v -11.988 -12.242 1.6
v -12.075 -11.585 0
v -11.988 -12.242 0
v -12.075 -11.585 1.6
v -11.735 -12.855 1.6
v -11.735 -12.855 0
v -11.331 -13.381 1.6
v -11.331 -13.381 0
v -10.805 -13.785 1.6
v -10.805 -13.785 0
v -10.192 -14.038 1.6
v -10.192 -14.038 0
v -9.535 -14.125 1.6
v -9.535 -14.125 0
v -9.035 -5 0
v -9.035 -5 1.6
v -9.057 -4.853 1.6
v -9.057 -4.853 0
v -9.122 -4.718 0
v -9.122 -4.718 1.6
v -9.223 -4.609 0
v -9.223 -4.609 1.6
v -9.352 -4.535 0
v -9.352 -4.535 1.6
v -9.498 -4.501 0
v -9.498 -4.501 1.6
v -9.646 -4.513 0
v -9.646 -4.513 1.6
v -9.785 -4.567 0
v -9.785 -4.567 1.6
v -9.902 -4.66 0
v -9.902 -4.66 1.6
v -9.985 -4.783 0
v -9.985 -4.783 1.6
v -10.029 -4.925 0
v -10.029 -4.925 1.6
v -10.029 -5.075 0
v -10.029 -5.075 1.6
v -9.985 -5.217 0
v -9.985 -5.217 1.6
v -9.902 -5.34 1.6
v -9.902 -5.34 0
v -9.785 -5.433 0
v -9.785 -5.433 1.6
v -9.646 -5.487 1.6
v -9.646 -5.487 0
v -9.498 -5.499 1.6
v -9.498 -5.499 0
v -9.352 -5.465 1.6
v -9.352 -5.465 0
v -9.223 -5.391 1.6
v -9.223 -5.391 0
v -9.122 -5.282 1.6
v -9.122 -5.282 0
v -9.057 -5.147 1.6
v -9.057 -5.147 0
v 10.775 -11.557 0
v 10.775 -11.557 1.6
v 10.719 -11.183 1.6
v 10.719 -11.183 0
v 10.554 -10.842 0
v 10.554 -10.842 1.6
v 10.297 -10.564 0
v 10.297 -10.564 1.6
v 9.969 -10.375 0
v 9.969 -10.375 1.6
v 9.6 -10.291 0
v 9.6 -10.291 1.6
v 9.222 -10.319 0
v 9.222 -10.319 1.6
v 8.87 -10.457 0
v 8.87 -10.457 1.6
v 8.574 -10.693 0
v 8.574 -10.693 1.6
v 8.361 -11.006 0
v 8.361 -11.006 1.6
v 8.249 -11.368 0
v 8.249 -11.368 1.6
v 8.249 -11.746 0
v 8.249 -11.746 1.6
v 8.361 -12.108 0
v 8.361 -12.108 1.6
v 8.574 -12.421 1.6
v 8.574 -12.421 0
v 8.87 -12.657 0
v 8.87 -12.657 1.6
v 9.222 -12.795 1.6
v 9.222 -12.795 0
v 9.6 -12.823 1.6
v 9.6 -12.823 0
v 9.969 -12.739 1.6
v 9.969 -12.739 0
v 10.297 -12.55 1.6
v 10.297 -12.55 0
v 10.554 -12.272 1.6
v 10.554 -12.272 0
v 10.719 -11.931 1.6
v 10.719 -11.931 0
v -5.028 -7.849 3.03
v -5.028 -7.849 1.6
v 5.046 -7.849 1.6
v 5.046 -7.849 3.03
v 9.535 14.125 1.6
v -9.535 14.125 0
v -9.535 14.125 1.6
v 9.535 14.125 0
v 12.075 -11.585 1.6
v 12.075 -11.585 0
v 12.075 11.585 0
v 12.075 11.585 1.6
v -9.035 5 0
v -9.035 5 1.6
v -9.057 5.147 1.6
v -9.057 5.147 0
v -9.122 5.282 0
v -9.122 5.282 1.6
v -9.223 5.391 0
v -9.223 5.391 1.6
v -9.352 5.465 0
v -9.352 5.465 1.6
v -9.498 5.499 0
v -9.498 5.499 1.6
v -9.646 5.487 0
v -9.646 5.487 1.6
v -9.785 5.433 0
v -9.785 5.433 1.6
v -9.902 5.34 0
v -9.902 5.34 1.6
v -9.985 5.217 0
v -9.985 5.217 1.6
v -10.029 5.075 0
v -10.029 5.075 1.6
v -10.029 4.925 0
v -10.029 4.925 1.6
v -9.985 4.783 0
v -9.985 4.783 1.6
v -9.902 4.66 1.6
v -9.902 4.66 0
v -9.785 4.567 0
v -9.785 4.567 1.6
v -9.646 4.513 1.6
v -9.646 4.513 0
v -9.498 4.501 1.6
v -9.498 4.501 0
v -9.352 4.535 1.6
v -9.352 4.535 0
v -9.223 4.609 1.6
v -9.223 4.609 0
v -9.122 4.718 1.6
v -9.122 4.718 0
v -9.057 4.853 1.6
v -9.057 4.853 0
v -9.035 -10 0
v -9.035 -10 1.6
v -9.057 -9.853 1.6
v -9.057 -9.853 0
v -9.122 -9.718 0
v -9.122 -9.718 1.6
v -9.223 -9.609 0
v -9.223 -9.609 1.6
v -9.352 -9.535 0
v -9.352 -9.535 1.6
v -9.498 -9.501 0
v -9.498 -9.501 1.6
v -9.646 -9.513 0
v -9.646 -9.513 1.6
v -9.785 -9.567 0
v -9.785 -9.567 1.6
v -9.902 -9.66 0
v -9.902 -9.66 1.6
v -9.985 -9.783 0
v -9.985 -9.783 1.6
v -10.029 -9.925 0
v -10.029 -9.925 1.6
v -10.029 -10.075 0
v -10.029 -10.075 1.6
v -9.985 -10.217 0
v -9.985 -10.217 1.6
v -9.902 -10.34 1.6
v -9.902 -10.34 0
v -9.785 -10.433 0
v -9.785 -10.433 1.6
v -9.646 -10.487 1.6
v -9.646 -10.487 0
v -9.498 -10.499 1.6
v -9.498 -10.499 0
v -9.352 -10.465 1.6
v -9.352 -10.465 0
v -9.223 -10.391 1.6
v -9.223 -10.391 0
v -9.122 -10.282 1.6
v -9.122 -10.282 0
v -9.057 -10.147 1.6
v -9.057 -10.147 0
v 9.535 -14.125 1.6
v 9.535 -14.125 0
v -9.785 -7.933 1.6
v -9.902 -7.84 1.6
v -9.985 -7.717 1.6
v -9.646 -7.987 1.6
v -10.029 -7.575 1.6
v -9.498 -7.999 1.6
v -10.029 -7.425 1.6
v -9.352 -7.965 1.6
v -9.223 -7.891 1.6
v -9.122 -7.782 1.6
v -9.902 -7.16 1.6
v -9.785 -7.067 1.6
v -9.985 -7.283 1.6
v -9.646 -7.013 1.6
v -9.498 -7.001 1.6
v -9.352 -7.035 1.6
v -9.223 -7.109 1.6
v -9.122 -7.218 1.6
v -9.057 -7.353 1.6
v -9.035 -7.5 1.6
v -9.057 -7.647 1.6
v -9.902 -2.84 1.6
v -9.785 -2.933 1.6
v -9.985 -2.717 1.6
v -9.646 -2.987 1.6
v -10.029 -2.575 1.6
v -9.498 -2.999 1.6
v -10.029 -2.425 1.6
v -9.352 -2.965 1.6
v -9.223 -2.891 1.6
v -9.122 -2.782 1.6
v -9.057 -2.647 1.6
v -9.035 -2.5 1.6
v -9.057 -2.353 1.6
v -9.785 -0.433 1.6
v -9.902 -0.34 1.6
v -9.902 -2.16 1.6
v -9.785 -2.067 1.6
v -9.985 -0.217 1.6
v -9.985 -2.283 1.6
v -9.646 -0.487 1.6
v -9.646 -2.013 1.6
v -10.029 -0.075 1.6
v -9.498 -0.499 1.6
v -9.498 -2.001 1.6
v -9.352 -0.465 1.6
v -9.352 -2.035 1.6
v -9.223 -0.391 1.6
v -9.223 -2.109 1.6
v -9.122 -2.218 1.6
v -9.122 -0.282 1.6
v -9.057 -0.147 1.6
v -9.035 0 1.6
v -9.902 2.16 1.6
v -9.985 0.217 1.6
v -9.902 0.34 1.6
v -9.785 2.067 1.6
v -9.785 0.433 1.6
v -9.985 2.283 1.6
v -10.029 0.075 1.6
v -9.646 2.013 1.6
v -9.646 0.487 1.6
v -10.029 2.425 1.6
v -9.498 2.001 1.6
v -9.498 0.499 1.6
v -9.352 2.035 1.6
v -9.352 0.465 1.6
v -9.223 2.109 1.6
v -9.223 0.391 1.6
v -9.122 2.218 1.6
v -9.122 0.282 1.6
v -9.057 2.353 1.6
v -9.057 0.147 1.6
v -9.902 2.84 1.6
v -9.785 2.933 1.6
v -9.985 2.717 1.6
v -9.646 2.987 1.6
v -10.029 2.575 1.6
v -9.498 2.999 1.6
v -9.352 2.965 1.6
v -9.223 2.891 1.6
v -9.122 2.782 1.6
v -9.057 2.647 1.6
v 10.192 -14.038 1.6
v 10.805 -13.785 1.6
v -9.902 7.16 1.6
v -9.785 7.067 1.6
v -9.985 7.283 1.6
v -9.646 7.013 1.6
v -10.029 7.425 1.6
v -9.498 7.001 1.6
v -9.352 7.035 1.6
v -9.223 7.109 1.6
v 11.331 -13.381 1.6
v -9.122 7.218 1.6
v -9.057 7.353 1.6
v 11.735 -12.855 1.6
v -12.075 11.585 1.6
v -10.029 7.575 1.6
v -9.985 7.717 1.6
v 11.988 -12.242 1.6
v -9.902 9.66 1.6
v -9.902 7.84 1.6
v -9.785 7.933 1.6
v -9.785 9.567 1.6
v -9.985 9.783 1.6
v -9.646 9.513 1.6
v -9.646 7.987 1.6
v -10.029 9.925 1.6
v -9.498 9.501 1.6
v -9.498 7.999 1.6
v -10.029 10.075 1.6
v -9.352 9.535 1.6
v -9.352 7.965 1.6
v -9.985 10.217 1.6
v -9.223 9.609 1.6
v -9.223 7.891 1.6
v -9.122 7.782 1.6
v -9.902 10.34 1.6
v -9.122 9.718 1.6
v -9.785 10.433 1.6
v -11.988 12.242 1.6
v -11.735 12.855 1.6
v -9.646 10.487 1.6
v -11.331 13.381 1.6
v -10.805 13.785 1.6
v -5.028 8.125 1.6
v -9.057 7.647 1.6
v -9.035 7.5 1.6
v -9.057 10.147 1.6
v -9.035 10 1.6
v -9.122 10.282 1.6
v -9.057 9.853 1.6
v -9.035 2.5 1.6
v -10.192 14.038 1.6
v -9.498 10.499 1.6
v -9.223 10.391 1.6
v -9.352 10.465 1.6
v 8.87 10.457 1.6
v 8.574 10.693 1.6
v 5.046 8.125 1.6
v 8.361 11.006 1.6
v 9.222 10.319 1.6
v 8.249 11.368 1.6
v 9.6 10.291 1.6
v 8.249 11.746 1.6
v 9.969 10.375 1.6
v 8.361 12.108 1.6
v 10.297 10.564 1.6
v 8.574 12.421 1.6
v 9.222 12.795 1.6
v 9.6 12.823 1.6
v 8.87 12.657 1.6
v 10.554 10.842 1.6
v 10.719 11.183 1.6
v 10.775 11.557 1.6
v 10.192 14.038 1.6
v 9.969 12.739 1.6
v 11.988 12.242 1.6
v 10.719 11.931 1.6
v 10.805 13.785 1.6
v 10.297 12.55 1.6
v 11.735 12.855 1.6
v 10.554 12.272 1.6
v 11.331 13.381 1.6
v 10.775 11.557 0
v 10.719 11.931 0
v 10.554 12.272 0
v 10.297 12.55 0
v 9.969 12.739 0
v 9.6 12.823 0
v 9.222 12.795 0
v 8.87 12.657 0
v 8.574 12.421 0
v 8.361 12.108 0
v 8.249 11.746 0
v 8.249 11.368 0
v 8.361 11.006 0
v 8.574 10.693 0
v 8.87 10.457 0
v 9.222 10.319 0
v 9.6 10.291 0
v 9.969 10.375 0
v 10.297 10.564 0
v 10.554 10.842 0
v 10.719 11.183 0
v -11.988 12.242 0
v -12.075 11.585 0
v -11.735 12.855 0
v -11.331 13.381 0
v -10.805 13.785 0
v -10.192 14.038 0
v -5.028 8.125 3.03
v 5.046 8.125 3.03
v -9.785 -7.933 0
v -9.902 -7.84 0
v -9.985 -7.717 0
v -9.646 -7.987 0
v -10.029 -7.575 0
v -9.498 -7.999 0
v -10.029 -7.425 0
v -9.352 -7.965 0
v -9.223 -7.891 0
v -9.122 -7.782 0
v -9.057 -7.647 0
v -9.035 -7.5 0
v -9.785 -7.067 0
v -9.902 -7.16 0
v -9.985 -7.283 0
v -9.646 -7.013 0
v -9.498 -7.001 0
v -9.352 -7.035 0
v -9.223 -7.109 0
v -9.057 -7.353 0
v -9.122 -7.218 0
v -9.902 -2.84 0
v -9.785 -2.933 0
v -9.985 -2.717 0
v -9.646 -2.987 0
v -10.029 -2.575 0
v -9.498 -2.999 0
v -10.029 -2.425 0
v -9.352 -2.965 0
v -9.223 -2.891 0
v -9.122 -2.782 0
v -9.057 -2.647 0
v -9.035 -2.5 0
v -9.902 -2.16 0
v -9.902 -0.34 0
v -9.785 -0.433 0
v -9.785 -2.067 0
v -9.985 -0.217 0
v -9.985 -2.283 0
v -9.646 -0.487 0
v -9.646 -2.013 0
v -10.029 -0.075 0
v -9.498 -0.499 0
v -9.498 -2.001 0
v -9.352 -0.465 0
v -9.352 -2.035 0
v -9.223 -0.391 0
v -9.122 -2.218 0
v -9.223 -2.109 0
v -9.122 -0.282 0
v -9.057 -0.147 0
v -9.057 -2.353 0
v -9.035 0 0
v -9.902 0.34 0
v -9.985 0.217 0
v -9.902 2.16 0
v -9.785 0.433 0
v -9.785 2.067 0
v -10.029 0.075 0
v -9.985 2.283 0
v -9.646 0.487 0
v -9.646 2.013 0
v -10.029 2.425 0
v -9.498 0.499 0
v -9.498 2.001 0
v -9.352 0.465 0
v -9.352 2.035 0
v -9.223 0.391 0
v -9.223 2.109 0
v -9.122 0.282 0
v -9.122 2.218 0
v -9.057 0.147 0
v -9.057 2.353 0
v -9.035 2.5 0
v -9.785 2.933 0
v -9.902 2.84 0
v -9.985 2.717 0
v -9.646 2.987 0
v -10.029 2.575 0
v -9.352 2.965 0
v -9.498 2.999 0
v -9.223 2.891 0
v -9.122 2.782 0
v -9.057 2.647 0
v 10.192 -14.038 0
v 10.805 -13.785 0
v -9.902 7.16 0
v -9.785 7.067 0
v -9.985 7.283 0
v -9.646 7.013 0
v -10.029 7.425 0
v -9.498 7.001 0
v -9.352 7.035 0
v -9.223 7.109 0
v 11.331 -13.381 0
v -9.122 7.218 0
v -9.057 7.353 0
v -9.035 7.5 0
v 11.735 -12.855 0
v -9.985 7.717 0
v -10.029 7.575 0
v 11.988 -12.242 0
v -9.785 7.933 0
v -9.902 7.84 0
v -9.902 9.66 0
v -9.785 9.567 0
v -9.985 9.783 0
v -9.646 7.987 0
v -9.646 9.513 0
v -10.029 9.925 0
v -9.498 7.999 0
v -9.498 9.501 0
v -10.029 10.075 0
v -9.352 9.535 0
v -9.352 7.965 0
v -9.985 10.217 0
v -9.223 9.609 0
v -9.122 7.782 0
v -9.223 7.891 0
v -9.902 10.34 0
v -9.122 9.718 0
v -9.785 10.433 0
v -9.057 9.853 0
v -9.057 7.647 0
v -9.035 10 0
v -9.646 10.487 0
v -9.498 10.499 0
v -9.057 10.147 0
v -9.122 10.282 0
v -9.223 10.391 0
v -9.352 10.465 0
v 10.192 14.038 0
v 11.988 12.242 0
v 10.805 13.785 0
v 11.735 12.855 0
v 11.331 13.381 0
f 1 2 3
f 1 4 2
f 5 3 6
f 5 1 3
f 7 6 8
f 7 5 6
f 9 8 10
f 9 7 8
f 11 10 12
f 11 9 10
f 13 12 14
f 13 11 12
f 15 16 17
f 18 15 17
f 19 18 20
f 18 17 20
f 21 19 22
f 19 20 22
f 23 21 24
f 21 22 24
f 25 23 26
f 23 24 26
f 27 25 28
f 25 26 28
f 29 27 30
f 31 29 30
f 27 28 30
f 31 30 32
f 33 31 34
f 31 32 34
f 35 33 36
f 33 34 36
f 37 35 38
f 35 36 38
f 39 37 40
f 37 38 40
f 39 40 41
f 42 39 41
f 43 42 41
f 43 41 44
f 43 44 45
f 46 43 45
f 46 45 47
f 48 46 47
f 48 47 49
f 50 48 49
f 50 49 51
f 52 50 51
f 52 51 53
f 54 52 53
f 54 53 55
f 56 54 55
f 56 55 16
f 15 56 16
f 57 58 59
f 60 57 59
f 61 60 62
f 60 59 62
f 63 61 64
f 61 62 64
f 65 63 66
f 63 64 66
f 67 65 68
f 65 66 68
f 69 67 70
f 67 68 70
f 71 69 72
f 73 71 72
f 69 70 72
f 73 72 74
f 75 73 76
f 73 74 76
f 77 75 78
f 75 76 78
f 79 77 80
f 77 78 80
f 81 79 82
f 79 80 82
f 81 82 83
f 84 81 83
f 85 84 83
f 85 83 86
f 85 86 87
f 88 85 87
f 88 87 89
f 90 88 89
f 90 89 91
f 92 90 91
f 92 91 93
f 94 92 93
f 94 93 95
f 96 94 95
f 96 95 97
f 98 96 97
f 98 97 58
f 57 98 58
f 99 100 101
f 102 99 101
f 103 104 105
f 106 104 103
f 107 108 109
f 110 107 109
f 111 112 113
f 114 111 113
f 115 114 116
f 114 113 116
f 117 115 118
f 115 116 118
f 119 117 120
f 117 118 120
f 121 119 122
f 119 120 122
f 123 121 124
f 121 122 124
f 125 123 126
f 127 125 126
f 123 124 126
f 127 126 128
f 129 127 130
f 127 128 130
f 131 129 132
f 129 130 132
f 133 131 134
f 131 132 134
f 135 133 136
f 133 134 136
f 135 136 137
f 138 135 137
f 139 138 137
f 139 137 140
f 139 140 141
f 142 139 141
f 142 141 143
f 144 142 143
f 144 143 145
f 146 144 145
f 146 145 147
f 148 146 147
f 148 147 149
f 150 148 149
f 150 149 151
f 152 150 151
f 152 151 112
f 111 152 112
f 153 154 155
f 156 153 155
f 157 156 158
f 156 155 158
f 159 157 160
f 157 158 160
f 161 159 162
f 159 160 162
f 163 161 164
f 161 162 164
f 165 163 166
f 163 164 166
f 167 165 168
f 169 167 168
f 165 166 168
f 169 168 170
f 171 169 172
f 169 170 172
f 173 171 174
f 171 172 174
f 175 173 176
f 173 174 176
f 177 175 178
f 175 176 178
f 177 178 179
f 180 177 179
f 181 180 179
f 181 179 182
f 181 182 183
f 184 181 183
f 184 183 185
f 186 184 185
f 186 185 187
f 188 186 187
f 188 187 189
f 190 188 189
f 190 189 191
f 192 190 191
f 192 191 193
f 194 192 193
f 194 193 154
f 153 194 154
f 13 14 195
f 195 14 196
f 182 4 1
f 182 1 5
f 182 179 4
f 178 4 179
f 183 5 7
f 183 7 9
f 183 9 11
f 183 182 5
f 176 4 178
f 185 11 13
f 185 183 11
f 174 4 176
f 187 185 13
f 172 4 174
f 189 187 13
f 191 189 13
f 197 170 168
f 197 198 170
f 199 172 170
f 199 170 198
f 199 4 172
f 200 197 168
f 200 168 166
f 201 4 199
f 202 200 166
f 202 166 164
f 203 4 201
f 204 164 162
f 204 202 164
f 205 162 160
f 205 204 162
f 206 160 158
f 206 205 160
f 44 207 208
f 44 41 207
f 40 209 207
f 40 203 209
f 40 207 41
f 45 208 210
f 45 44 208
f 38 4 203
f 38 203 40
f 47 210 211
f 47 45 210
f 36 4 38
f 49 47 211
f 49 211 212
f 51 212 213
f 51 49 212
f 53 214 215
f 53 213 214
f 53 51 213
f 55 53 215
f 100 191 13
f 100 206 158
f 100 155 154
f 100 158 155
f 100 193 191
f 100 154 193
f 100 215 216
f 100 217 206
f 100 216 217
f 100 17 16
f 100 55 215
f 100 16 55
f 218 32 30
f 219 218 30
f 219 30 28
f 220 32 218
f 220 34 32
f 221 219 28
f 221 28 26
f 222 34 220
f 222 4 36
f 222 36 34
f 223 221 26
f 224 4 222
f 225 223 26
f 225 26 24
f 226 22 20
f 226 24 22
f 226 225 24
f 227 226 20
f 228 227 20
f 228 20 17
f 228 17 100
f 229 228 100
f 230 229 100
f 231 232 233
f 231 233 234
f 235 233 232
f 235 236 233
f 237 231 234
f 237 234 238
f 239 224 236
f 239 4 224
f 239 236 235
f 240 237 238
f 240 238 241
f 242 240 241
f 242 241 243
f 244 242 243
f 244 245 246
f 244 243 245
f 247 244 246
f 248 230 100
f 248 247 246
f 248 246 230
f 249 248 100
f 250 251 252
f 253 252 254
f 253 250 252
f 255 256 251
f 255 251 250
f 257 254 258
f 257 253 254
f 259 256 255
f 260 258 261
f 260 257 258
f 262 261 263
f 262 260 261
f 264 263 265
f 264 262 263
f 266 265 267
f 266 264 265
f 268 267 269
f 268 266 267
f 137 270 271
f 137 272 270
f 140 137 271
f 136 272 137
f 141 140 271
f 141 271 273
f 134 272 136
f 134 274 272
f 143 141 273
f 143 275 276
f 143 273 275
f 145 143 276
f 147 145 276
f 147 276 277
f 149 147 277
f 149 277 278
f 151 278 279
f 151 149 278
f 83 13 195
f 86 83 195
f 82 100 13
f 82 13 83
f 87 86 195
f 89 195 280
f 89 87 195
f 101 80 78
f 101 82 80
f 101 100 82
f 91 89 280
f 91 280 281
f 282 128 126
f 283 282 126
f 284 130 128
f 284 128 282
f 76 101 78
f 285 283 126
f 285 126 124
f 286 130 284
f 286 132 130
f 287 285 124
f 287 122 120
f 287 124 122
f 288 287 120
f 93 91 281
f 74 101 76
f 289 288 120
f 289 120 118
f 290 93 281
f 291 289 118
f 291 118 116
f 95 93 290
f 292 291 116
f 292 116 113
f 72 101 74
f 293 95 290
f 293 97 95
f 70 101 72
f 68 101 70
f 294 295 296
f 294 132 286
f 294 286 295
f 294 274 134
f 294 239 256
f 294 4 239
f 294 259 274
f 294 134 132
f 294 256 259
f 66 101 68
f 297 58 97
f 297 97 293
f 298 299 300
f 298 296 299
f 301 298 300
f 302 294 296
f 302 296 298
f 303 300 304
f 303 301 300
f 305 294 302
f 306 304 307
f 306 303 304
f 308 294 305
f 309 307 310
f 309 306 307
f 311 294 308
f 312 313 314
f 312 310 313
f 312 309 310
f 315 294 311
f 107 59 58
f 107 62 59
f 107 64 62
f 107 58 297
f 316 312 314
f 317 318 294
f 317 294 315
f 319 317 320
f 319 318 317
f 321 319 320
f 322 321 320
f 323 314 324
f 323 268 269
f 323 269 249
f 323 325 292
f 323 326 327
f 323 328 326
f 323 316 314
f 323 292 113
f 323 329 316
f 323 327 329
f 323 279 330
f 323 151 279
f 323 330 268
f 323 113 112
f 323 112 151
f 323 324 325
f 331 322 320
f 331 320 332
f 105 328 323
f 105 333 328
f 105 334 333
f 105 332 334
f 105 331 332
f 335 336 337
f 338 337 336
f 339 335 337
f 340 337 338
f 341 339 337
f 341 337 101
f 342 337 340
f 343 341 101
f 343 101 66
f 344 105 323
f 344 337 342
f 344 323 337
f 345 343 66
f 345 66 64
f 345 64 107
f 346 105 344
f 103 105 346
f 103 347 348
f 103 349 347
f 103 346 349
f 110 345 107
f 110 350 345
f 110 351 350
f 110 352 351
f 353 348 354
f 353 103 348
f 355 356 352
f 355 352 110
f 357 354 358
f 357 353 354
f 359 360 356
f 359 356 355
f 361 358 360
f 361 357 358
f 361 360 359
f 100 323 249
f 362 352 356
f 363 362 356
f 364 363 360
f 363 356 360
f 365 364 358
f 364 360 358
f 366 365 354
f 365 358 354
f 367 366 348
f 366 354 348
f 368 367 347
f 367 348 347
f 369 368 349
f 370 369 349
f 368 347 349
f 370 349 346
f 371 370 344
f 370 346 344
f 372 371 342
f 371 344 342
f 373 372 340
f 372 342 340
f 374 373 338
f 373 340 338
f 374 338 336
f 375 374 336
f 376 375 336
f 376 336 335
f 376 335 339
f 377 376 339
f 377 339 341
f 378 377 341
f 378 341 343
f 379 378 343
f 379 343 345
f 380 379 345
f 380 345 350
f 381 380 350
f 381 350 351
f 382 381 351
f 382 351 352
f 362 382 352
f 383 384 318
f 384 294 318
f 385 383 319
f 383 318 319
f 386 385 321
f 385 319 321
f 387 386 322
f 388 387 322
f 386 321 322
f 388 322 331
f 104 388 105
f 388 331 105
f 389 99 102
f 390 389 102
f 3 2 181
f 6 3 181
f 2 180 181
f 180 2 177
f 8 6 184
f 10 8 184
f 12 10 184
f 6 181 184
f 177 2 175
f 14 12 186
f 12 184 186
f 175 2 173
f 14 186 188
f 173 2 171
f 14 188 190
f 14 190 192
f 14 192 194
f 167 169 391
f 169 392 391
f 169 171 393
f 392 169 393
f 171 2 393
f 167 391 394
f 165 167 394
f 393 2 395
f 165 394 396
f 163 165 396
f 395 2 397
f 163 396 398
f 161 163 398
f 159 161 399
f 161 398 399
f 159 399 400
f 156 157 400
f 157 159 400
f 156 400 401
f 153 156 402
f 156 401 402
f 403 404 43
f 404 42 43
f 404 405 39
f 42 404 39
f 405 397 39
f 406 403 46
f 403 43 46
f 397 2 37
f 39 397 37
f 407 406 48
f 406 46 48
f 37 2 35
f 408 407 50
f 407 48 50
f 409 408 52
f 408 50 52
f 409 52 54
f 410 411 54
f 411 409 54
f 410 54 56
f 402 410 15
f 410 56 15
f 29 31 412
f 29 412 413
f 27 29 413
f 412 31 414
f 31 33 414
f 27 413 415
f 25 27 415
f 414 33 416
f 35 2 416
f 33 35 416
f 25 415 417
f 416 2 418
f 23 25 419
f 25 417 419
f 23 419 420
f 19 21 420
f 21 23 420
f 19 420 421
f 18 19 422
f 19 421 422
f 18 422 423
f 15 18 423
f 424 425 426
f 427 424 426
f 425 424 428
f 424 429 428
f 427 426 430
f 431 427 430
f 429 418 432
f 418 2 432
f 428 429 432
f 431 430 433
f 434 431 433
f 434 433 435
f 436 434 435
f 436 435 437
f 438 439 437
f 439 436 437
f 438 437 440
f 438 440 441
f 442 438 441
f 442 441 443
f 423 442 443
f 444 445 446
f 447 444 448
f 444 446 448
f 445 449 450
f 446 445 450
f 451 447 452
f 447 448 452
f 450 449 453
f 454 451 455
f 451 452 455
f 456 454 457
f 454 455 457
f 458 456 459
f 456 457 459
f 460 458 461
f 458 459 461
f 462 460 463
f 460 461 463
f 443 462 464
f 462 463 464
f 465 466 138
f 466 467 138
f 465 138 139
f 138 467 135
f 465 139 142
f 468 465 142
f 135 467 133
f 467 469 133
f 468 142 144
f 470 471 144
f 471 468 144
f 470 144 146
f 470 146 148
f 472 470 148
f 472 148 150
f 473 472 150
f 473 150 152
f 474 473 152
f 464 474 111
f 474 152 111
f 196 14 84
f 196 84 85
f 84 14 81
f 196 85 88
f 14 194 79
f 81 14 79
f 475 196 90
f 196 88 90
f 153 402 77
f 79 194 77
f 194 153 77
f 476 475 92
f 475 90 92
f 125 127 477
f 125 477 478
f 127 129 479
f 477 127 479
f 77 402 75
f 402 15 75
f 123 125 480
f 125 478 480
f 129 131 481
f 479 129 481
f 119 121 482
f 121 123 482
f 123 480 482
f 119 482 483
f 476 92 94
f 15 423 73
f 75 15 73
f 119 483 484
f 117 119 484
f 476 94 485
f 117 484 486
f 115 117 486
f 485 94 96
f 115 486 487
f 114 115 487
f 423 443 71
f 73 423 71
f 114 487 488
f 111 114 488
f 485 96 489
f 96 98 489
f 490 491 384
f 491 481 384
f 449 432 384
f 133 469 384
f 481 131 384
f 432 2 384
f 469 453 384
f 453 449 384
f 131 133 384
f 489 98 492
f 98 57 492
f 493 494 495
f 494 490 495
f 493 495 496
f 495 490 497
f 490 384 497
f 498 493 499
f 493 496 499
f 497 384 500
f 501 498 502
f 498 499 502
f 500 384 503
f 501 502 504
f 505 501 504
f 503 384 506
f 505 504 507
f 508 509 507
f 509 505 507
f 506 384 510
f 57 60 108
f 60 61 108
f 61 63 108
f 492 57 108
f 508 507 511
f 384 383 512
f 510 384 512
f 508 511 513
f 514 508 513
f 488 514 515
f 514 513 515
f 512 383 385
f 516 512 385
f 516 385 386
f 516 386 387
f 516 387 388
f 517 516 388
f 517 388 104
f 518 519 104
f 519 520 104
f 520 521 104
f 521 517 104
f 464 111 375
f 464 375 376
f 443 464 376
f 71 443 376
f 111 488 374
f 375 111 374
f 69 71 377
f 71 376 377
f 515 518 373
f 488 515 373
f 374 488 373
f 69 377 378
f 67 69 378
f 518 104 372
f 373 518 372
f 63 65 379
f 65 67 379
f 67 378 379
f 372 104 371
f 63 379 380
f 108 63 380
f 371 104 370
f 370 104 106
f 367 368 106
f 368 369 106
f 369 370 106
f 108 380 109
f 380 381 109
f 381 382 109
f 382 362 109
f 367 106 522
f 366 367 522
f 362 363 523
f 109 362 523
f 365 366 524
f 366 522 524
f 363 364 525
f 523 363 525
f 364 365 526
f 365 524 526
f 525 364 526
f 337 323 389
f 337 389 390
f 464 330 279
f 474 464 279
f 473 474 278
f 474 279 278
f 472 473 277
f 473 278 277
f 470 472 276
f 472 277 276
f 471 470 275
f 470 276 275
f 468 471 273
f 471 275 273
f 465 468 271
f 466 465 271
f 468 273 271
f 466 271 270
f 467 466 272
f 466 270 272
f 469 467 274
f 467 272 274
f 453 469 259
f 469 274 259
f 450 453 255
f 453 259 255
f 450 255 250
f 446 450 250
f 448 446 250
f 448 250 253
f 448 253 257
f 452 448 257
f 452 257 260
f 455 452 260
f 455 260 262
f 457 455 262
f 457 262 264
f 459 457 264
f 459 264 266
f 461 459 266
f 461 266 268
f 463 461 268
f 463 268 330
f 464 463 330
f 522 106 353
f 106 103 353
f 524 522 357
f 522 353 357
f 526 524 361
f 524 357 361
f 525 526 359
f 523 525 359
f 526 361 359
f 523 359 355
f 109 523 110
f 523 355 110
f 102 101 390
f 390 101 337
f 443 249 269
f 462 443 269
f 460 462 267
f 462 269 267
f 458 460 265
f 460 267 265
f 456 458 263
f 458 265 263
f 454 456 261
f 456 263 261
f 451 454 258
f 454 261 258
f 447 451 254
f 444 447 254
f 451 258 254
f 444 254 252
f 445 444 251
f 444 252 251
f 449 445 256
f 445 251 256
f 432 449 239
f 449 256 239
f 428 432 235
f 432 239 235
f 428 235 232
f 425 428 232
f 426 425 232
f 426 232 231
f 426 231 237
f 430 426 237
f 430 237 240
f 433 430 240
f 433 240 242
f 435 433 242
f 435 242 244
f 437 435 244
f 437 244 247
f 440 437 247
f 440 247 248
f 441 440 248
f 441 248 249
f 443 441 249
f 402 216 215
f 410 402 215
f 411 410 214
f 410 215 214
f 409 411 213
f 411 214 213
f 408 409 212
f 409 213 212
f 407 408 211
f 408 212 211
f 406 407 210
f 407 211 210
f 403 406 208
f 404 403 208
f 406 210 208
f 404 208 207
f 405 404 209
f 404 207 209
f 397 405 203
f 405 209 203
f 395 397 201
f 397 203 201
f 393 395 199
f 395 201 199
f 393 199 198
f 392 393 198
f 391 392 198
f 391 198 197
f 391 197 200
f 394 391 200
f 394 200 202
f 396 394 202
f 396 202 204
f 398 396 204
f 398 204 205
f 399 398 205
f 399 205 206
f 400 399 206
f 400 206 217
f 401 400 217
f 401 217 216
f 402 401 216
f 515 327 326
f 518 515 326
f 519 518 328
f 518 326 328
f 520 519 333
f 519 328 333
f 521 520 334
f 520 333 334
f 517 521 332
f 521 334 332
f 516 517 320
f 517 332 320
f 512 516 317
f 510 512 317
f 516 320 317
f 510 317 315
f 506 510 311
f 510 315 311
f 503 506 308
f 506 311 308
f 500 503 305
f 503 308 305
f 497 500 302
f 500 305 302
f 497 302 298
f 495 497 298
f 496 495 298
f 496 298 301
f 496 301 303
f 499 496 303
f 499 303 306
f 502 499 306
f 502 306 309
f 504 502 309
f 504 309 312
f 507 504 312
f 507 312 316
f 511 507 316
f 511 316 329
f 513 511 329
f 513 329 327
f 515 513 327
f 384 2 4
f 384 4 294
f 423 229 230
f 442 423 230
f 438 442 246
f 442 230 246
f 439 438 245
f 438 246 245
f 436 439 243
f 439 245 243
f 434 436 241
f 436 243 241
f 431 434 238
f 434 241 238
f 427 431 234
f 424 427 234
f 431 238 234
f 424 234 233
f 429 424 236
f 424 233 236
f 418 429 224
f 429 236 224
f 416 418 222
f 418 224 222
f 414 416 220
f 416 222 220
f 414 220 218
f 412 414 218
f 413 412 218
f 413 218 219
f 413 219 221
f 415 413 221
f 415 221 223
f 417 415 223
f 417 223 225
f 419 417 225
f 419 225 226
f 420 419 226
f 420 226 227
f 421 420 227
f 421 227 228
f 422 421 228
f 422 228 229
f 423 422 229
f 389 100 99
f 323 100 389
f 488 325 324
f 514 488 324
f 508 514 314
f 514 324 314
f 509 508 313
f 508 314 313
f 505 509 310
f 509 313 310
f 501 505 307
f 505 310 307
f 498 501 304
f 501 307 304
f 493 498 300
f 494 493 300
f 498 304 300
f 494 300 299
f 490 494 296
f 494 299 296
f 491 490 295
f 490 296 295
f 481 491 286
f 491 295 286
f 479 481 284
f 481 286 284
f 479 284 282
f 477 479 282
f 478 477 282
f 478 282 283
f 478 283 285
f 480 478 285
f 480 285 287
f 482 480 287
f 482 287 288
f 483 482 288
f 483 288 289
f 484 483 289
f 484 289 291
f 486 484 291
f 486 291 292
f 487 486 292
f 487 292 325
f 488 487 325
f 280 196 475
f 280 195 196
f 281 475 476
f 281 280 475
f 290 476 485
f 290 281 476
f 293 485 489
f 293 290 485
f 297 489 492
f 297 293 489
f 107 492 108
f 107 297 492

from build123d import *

# Parameters (mm, degrees)
SKETCH1_W           = 24.15
SKETCH1_H           = 28.25
BOSS_EXTRUDE1_DEPTH = 1.6
SKETCH2_R           = 1.27
CUT_EXTRUDE1_DEPTH  = 19.651575001
FILLET1_R           = 2.54
SKETCH3_R           = 0.5
CUT_EXTRUDE2_DEPTH  = 19.651575001
LPATTERN1_COUNT     = 5
LPATTERN1_PITCH     = 2.5
LPATTERN1_COL_COUNT = 5
LPATTERN1_COL_PITCH = 2.5
SKETCH4_W           = 10.07376305
SKETCH4_H           = 15.97396984
BOSS_EXTRUDE2_DEPTH = 1.43


with BuildPart() as part:
    # Sketch1 → Boss-Extrude1 (new body)
    with BuildSketch(Plane.XY):
        Rectangle(SKETCH1_W, SKETCH1_H)
    extrude(amount=BOSS_EXTRUDE1_DEPTH)

    # Sketch2 → Cut-Extrude1 (cut, through all)
    with BuildSketch(Plane.XY.offset(1.6)):
        with Locations((9.505, 11.557)):
            Circle(SKETCH2_R)
        with Locations((9.505, -11.557)):
            Circle(SKETCH2_R)
    extrude(amount=-CUT_EXTRUDE1_DEPTH, mode=Mode.SUBTRACT)

    # Fillet1
    fillet1_edges = [part.edges().sort_by_distance(p)[0] for p in [
        (12.075, -14.125, 0.8),
        (-12.075, -14.125, 0.8),
        (-12.075, 14.125, 0.8),
        (12.075, 14.125, 0.8),
    ]]
    fillet(fillet1_edges, radius=FILLET1_R)

    # Sketch3 → Cut-Extrude2 (cut, through all)
    with BuildSketch(Plane.XY.offset(1.6)):
        with Locations((-9.535, 0)):
            Circle(SKETCH3_R)
    cut_extrude2 = extrude(amount=-CUT_EXTRUDE2_DEPTH, mode=Mode.SUBTRACT)

    # LPattern1: Cut-Extrude2 ×5
    with Locations(*[(0, -i * LPATTERN1_PITCH, 0) for i in range(1, LPATTERN1_COUNT)]):
        add(cut_extrude2, mode=Mode.SUBTRACT)

    # LPattern1 col: Cut-Extrude2 ×5
    with Locations(*[(0, i * LPATTERN1_COL_PITCH, 0) for i in range(1, LPATTERN1_COL_COUNT)]):
        add(cut_extrude2, mode=Mode.SUBTRACT)

    # Sketch4 → Boss-Extrude2 (add)
    with BuildSketch(Plane.XY.offset(1.6)):
        with Locations((0.008744266, 0.138172191)):
            Rectangle(SKETCH4_W, SKETCH4_H)
    extrude(amount=BOSS_EXTRUDE2_DEPTH)


solid = part.part
